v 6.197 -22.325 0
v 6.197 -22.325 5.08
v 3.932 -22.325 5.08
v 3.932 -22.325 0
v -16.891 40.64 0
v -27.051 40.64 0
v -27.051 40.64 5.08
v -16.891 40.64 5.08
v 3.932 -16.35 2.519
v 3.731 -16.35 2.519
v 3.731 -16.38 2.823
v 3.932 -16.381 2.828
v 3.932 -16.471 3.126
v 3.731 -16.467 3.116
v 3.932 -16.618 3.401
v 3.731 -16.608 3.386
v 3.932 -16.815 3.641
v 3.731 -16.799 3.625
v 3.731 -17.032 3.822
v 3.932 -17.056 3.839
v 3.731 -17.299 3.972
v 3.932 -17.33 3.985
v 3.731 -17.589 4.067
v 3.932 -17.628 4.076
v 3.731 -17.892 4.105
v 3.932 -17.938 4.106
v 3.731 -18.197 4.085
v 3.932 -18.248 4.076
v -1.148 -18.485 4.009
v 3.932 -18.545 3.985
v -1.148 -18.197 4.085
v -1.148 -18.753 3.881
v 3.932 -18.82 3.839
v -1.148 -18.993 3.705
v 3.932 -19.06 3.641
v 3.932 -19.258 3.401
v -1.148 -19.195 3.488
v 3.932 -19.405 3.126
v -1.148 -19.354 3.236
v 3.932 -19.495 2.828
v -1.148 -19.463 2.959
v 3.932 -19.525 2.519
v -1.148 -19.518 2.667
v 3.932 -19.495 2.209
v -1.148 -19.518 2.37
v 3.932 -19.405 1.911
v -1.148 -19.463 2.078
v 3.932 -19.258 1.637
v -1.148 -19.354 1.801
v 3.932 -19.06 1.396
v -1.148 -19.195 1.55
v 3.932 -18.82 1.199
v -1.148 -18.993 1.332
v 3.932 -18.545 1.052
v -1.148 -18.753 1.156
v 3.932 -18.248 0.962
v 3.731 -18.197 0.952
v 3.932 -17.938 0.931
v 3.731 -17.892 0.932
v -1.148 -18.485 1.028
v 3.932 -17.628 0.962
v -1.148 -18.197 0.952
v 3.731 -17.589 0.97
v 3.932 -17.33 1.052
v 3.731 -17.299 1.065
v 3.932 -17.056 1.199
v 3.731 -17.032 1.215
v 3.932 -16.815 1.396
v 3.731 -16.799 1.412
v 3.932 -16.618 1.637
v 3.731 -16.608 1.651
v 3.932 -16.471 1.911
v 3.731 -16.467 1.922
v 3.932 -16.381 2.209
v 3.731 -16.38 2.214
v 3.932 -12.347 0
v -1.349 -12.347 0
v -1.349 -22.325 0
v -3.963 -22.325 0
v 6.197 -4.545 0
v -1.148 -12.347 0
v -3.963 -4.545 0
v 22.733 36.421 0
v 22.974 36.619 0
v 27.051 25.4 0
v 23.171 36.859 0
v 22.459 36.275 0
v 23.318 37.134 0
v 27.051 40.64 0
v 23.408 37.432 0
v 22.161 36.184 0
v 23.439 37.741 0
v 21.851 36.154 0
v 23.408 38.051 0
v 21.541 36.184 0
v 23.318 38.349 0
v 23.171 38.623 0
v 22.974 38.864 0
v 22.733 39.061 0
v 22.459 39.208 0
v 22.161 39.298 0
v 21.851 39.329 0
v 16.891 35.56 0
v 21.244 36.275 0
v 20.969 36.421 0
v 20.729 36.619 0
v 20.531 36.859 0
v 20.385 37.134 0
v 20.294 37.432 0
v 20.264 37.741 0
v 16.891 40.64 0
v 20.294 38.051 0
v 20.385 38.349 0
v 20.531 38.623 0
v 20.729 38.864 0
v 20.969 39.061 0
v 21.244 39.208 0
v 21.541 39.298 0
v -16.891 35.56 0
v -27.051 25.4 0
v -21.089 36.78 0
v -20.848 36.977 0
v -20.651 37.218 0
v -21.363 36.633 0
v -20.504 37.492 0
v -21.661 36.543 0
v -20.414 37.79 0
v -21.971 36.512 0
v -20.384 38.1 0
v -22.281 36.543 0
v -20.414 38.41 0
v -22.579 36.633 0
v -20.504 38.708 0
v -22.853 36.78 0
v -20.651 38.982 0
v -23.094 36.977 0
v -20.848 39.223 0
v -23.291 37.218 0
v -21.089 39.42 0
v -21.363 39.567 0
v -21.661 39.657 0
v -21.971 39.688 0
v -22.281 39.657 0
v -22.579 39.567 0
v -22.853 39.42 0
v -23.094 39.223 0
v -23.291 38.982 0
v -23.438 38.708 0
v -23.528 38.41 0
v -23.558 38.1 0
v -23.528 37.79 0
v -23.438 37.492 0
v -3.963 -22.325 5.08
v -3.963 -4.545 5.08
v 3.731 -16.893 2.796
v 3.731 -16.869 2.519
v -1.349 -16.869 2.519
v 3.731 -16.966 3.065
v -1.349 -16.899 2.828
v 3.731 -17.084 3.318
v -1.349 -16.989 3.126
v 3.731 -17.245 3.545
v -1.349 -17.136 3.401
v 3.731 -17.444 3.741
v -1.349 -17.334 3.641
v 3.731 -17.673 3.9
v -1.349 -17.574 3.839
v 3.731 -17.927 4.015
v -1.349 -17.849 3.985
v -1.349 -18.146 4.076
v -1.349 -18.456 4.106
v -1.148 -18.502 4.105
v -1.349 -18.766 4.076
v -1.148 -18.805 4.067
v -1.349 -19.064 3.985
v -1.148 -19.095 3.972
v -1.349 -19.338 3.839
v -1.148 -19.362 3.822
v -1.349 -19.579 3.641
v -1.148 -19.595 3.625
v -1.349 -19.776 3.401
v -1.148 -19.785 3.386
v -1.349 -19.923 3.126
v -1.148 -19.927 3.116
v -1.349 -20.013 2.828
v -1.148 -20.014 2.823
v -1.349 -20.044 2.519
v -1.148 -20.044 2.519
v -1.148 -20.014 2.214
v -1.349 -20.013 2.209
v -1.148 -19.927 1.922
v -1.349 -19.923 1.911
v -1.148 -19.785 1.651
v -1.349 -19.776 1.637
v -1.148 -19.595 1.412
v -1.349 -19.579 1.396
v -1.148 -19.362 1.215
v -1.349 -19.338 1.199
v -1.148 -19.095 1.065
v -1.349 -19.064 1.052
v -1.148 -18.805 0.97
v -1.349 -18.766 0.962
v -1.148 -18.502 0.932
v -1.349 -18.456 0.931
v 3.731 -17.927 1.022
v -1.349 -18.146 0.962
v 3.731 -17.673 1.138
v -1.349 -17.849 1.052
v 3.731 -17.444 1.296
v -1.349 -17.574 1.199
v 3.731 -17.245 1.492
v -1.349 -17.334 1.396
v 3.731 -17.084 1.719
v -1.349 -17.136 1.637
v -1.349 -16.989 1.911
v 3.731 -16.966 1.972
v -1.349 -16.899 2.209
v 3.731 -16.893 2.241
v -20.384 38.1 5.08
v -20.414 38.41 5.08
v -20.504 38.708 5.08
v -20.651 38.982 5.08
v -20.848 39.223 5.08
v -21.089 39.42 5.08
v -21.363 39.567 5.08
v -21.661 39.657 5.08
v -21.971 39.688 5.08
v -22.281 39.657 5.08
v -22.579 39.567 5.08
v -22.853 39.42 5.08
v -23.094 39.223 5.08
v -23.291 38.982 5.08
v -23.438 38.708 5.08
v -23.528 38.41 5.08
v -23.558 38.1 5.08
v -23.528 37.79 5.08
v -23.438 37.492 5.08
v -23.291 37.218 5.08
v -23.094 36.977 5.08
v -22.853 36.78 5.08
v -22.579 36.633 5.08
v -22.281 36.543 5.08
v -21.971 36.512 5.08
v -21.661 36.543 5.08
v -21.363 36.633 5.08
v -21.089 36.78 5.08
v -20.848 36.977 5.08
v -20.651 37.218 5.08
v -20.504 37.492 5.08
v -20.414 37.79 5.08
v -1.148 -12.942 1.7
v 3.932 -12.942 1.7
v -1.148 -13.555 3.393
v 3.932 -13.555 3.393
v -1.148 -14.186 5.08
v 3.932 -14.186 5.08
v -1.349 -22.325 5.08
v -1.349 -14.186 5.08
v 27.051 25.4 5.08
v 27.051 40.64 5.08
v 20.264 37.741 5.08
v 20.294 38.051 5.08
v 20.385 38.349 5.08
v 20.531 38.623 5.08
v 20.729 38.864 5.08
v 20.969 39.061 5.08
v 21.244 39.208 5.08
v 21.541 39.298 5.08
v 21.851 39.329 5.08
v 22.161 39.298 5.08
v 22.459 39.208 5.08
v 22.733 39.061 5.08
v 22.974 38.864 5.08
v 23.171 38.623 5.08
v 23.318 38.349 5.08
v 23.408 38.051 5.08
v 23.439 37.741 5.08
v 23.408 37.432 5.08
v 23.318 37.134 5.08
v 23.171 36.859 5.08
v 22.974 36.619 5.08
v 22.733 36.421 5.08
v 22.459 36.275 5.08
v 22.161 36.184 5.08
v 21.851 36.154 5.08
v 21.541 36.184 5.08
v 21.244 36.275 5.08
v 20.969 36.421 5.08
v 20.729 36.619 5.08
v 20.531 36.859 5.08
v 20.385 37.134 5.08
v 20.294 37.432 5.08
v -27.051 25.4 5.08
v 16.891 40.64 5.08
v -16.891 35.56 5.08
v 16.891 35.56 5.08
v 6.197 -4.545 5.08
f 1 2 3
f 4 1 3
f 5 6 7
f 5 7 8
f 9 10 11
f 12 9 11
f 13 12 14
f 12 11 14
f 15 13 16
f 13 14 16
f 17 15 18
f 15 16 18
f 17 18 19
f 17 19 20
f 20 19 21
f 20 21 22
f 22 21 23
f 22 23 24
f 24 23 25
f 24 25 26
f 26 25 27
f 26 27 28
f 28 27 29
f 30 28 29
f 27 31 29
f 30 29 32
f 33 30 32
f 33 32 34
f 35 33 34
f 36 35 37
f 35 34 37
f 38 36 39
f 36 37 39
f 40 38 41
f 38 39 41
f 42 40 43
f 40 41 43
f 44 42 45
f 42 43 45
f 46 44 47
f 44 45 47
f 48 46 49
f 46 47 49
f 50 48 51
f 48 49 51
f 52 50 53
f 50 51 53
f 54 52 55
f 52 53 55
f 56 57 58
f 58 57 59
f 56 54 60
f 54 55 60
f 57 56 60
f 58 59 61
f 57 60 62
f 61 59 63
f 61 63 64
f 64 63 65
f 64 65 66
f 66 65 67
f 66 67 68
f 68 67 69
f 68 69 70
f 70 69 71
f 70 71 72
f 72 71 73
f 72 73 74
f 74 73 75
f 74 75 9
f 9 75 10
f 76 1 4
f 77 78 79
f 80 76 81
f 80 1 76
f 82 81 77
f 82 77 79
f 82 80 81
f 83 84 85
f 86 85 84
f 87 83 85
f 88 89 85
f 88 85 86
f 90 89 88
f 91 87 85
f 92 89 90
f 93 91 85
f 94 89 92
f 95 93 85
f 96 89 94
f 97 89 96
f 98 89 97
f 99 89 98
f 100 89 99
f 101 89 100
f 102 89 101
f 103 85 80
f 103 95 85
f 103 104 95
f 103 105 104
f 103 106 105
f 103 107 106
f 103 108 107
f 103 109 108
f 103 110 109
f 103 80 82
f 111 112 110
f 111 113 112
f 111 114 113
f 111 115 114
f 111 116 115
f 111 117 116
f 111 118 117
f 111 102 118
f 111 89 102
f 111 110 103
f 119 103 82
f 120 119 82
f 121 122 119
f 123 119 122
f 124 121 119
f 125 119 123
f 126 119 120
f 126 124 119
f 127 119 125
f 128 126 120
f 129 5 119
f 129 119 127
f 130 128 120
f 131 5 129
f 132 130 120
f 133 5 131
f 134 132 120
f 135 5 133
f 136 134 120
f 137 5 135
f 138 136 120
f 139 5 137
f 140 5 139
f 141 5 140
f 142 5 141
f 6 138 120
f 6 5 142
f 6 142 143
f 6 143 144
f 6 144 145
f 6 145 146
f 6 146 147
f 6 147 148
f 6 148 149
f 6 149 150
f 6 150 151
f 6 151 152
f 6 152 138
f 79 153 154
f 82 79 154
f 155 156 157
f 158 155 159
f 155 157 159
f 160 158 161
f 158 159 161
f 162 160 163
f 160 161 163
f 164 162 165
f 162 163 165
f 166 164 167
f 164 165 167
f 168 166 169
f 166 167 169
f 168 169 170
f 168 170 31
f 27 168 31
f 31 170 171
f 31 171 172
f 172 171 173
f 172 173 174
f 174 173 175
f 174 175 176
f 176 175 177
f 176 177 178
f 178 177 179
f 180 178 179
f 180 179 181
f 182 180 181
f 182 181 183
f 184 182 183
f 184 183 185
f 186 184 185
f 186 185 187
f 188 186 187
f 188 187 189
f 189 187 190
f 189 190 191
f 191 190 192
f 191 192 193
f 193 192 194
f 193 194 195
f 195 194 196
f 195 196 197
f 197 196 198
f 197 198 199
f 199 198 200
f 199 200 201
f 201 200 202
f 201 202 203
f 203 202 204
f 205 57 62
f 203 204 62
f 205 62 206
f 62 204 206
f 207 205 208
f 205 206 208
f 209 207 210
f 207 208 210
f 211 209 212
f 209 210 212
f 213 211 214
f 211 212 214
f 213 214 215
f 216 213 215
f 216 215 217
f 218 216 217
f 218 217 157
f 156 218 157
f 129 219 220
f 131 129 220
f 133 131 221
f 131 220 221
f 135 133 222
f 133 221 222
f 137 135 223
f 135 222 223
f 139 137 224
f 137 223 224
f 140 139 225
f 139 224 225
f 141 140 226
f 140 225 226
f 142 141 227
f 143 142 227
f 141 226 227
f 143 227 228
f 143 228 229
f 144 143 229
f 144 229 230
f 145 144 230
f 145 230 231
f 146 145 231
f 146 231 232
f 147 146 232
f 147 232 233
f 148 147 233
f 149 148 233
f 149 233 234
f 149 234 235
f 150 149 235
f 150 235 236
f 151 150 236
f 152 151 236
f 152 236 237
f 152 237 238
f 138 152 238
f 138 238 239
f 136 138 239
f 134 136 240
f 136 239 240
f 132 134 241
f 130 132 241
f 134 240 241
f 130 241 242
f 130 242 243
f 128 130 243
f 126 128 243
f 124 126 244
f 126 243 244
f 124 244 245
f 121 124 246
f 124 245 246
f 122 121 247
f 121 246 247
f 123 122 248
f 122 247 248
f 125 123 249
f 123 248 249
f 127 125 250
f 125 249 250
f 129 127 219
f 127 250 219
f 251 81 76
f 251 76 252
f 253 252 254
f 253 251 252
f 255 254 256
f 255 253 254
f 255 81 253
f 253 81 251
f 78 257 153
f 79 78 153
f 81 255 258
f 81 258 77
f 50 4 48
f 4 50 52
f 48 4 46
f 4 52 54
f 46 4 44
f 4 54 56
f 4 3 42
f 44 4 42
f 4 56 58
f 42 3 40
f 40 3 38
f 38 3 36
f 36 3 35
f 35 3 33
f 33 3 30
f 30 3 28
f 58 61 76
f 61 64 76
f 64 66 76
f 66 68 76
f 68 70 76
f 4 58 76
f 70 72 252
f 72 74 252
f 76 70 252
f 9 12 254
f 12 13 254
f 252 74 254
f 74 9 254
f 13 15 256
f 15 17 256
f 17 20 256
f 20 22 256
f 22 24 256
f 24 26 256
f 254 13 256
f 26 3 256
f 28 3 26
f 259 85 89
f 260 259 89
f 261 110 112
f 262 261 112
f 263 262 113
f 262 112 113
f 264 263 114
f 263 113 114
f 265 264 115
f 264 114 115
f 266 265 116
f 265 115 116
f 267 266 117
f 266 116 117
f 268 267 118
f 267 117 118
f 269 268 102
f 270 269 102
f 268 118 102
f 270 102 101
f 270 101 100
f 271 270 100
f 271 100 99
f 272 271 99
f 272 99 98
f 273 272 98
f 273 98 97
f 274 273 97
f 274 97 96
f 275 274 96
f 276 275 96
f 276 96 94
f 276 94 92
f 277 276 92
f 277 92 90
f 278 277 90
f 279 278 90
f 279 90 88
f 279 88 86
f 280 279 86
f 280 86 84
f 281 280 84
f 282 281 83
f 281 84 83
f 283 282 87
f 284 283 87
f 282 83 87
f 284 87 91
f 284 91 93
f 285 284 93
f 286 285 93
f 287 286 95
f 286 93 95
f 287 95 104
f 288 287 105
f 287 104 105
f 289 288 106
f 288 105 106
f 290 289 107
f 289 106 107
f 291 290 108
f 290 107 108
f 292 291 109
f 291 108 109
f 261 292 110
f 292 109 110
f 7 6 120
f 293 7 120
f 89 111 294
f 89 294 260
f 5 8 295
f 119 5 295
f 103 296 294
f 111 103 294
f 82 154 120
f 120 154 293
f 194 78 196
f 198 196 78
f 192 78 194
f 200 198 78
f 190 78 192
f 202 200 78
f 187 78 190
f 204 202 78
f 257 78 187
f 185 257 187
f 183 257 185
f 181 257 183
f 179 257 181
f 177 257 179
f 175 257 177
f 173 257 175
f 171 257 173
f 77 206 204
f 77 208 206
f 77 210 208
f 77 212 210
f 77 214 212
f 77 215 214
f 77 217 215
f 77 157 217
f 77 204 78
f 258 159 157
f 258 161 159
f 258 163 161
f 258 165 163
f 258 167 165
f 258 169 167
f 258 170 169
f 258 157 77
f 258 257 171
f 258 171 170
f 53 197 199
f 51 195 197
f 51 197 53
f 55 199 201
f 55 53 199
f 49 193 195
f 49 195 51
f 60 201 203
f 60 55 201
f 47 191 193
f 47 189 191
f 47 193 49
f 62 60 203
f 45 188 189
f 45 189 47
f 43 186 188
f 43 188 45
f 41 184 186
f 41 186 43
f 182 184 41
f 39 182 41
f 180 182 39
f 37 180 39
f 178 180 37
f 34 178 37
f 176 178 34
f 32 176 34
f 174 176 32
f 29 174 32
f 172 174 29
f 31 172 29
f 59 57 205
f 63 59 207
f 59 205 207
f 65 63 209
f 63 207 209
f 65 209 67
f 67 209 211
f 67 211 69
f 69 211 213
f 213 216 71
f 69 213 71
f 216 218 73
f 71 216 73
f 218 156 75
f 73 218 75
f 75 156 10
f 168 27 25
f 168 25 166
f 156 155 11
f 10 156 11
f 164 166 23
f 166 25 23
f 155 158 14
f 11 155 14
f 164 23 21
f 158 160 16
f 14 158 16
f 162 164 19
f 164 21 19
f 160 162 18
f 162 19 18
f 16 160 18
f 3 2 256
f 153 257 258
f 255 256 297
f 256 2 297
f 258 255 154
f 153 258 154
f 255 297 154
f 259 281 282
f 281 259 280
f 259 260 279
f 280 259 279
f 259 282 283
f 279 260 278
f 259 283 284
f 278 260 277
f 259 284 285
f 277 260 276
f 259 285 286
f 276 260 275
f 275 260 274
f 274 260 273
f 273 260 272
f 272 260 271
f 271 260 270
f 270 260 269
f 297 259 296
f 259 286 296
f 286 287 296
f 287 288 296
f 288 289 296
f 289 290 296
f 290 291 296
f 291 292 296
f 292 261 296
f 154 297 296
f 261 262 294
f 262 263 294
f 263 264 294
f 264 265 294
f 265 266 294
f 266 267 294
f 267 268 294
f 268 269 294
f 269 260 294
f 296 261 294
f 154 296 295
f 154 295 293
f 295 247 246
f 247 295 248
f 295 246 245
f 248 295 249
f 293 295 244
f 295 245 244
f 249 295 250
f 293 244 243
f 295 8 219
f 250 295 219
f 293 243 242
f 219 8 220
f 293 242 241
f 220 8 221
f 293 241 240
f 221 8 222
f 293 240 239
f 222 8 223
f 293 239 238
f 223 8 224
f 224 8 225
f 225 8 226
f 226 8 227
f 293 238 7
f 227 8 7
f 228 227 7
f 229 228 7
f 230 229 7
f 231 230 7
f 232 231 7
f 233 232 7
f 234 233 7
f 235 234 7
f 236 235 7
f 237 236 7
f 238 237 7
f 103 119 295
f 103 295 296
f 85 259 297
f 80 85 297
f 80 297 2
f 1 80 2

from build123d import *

# Parameters (mm, degrees)
BOSS_EXTRUDE1_DEPTH = 5.08
SKETCH2_R           = 1.5875
CUT_EXTRUDE1_DEPTH  = 50.083323044
SKETCH3_R           = 1.5875
CUT_EXTRUDE2_DEPTH  = 50.083323044
CAVITY1_START       = -1.349094449
CAVITY1_OUTLINE_R   = 1.5875
CAVITY1_DEPTH       = 5.08
CUT_EXTRUDE4_DEPTH  = 50.083323044
CAVITY3_START       = -1.147520379
CAVITY3_OUTLINE_R   = 1.5875
CAVITY3_DEPTH       = 5.08
CUT_EXTRUDE5_DEPTH  = 0.20157407


# Read off the part's stored shape, not the designer's step: Cavity1, Cavity3
with BuildPart() as part:
    # Sketch1 → Boss-Extrude1 (new body)
    with BuildSketch(Plane.XY):
        Polygon((-27.051, 40.64), (-16.891, 40.64), (-16.891, 35.56), (16.891, 35.56), (16.891, 40.64), (27.051, 40.64), (27.051, 30.48), (27.051, -40.64), (-27.051, -40.64), (-27.051, 30.48), align=None)
    extrude(amount=BOSS_EXTRUDE1_DEPTH)

    # Sketch2 → Cut-Extrude1 (cut, through all)
    with BuildSketch(Plane.XY.offset(5.08)):
        with Locations((-21.971, 38.1)):
            Circle(SKETCH2_R)
    extrude(amount=-CUT_EXTRUDE1_DEPTH, mode=Mode.SUBTRACT)

    # Sketch3 → Cut-Extrude2 (cut, through all)
    with BuildSketch(Plane(origin=(0, 0, 0), x_dir=(-1, 0, 0), z_dir=(0, 0, -1))):
        with Locations((-21.851181845, 37.741299139)):
            Circle(SKETCH3_R)
    extrude(amount=-CUT_EXTRUDE2_DEPTH, mode=Mode.SUBTRACT)

    # Cavity1 outline → Cavity1 (cut)
    with BuildSketch(Plane.YZ.offset(CAVITY1_START)):
        with BuildLine():
            Line((-14.704392822, 5.08), (-26.073978973, 5.08))
            ThreePointArc((-26.073978973, 5.08), (-25.829625006, 2.541825867), (-25.626750522, 0))
            Line((-25.626750522, 0), (-12.865436781, 0))
            ThreePointArc((-12.865436781, 0), (-13.763940636, 2.547592632), (-14.704392822, 5.08))
        make_face()
        with Locations((-18.456090827, 2.518577165)):
            Circle(CAVITY1_OUTLINE_R, mode=Mode.SUBTRACT)
    extrude(amount=CAVITY1_DEPTH, mode=Mode.SUBTRACT)

    # Sketch4 → Cut-Extrude4 (cut, through all)
    with BuildSketch(Plane.XY.offset(5.08)):
        Polygon((-3.962834865, -4.544614252), (-27.051, 25.4), (-27.051, -40.64), (27.051, -40.64), (27.051, 25.4), (6.197256749, -4.544614252), (6.197256749, -22.324614252), (3.730905551, -22.324614252), (3.730905551, -26.073978973), (-1.349094449, -26.073978973), (-1.349094449, -22.324614252), (-3.962834865, -22.324614252), align=None)
    extrude(amount=-CUT_EXTRUDE4_DEPTH, mode=Mode.SUBTRACT)


with BuildPart() as cut_extrude4_kept_piece:
    # of the separate pieces the step leaves, the one the design keeps (cut_extrude4_pieces_kept)
    add(part.part.solids().sort_by_distance((-27.051, 40.64, 0))[0])

    # Cavity3 outline → Cavity3 (cut)
    with BuildSketch(Plane.YZ.offset(CAVITY3_START)):
        with BuildLine():
            ThreePointArc((-12.347244957, 0), (-13.245748811, 2.547592632), (-14.186200998, 5.08))
            Line((-14.186200998, 5.08), (-22.324614252, 5.08))
            Line((-22.324614252, 5.08), (-22.324614252, 0))
            Line((-22.324614252, 0), (-12.347244957, 0))
        make_face()
        with Locations((-17.937899002, 2.518577165)):
            Circle(CAVITY3_OUTLINE_R, mode=Mode.SUBTRACT)
    extrude(amount=CAVITY3_DEPTH, mode=Mode.SUBTRACT)

    # Sketch7 → Cut-Extrude5 (cut)
    with BuildSketch(Plane(origin=(-1.147520379, 0, 0), x_dir=(0, 0, -1), z_dir=(1, 0, 0))):
        Polygon((-5.08, -14.186200998), (0, -12.347244957), (0, -12.865436781), (-5.08, -14.704392822), align=None)
    extrude(amount=-CUT_EXTRUDE5_DEPTH, mode=Mode.SUBTRACT)


solid = cut_extrude4_kept_piece.part
